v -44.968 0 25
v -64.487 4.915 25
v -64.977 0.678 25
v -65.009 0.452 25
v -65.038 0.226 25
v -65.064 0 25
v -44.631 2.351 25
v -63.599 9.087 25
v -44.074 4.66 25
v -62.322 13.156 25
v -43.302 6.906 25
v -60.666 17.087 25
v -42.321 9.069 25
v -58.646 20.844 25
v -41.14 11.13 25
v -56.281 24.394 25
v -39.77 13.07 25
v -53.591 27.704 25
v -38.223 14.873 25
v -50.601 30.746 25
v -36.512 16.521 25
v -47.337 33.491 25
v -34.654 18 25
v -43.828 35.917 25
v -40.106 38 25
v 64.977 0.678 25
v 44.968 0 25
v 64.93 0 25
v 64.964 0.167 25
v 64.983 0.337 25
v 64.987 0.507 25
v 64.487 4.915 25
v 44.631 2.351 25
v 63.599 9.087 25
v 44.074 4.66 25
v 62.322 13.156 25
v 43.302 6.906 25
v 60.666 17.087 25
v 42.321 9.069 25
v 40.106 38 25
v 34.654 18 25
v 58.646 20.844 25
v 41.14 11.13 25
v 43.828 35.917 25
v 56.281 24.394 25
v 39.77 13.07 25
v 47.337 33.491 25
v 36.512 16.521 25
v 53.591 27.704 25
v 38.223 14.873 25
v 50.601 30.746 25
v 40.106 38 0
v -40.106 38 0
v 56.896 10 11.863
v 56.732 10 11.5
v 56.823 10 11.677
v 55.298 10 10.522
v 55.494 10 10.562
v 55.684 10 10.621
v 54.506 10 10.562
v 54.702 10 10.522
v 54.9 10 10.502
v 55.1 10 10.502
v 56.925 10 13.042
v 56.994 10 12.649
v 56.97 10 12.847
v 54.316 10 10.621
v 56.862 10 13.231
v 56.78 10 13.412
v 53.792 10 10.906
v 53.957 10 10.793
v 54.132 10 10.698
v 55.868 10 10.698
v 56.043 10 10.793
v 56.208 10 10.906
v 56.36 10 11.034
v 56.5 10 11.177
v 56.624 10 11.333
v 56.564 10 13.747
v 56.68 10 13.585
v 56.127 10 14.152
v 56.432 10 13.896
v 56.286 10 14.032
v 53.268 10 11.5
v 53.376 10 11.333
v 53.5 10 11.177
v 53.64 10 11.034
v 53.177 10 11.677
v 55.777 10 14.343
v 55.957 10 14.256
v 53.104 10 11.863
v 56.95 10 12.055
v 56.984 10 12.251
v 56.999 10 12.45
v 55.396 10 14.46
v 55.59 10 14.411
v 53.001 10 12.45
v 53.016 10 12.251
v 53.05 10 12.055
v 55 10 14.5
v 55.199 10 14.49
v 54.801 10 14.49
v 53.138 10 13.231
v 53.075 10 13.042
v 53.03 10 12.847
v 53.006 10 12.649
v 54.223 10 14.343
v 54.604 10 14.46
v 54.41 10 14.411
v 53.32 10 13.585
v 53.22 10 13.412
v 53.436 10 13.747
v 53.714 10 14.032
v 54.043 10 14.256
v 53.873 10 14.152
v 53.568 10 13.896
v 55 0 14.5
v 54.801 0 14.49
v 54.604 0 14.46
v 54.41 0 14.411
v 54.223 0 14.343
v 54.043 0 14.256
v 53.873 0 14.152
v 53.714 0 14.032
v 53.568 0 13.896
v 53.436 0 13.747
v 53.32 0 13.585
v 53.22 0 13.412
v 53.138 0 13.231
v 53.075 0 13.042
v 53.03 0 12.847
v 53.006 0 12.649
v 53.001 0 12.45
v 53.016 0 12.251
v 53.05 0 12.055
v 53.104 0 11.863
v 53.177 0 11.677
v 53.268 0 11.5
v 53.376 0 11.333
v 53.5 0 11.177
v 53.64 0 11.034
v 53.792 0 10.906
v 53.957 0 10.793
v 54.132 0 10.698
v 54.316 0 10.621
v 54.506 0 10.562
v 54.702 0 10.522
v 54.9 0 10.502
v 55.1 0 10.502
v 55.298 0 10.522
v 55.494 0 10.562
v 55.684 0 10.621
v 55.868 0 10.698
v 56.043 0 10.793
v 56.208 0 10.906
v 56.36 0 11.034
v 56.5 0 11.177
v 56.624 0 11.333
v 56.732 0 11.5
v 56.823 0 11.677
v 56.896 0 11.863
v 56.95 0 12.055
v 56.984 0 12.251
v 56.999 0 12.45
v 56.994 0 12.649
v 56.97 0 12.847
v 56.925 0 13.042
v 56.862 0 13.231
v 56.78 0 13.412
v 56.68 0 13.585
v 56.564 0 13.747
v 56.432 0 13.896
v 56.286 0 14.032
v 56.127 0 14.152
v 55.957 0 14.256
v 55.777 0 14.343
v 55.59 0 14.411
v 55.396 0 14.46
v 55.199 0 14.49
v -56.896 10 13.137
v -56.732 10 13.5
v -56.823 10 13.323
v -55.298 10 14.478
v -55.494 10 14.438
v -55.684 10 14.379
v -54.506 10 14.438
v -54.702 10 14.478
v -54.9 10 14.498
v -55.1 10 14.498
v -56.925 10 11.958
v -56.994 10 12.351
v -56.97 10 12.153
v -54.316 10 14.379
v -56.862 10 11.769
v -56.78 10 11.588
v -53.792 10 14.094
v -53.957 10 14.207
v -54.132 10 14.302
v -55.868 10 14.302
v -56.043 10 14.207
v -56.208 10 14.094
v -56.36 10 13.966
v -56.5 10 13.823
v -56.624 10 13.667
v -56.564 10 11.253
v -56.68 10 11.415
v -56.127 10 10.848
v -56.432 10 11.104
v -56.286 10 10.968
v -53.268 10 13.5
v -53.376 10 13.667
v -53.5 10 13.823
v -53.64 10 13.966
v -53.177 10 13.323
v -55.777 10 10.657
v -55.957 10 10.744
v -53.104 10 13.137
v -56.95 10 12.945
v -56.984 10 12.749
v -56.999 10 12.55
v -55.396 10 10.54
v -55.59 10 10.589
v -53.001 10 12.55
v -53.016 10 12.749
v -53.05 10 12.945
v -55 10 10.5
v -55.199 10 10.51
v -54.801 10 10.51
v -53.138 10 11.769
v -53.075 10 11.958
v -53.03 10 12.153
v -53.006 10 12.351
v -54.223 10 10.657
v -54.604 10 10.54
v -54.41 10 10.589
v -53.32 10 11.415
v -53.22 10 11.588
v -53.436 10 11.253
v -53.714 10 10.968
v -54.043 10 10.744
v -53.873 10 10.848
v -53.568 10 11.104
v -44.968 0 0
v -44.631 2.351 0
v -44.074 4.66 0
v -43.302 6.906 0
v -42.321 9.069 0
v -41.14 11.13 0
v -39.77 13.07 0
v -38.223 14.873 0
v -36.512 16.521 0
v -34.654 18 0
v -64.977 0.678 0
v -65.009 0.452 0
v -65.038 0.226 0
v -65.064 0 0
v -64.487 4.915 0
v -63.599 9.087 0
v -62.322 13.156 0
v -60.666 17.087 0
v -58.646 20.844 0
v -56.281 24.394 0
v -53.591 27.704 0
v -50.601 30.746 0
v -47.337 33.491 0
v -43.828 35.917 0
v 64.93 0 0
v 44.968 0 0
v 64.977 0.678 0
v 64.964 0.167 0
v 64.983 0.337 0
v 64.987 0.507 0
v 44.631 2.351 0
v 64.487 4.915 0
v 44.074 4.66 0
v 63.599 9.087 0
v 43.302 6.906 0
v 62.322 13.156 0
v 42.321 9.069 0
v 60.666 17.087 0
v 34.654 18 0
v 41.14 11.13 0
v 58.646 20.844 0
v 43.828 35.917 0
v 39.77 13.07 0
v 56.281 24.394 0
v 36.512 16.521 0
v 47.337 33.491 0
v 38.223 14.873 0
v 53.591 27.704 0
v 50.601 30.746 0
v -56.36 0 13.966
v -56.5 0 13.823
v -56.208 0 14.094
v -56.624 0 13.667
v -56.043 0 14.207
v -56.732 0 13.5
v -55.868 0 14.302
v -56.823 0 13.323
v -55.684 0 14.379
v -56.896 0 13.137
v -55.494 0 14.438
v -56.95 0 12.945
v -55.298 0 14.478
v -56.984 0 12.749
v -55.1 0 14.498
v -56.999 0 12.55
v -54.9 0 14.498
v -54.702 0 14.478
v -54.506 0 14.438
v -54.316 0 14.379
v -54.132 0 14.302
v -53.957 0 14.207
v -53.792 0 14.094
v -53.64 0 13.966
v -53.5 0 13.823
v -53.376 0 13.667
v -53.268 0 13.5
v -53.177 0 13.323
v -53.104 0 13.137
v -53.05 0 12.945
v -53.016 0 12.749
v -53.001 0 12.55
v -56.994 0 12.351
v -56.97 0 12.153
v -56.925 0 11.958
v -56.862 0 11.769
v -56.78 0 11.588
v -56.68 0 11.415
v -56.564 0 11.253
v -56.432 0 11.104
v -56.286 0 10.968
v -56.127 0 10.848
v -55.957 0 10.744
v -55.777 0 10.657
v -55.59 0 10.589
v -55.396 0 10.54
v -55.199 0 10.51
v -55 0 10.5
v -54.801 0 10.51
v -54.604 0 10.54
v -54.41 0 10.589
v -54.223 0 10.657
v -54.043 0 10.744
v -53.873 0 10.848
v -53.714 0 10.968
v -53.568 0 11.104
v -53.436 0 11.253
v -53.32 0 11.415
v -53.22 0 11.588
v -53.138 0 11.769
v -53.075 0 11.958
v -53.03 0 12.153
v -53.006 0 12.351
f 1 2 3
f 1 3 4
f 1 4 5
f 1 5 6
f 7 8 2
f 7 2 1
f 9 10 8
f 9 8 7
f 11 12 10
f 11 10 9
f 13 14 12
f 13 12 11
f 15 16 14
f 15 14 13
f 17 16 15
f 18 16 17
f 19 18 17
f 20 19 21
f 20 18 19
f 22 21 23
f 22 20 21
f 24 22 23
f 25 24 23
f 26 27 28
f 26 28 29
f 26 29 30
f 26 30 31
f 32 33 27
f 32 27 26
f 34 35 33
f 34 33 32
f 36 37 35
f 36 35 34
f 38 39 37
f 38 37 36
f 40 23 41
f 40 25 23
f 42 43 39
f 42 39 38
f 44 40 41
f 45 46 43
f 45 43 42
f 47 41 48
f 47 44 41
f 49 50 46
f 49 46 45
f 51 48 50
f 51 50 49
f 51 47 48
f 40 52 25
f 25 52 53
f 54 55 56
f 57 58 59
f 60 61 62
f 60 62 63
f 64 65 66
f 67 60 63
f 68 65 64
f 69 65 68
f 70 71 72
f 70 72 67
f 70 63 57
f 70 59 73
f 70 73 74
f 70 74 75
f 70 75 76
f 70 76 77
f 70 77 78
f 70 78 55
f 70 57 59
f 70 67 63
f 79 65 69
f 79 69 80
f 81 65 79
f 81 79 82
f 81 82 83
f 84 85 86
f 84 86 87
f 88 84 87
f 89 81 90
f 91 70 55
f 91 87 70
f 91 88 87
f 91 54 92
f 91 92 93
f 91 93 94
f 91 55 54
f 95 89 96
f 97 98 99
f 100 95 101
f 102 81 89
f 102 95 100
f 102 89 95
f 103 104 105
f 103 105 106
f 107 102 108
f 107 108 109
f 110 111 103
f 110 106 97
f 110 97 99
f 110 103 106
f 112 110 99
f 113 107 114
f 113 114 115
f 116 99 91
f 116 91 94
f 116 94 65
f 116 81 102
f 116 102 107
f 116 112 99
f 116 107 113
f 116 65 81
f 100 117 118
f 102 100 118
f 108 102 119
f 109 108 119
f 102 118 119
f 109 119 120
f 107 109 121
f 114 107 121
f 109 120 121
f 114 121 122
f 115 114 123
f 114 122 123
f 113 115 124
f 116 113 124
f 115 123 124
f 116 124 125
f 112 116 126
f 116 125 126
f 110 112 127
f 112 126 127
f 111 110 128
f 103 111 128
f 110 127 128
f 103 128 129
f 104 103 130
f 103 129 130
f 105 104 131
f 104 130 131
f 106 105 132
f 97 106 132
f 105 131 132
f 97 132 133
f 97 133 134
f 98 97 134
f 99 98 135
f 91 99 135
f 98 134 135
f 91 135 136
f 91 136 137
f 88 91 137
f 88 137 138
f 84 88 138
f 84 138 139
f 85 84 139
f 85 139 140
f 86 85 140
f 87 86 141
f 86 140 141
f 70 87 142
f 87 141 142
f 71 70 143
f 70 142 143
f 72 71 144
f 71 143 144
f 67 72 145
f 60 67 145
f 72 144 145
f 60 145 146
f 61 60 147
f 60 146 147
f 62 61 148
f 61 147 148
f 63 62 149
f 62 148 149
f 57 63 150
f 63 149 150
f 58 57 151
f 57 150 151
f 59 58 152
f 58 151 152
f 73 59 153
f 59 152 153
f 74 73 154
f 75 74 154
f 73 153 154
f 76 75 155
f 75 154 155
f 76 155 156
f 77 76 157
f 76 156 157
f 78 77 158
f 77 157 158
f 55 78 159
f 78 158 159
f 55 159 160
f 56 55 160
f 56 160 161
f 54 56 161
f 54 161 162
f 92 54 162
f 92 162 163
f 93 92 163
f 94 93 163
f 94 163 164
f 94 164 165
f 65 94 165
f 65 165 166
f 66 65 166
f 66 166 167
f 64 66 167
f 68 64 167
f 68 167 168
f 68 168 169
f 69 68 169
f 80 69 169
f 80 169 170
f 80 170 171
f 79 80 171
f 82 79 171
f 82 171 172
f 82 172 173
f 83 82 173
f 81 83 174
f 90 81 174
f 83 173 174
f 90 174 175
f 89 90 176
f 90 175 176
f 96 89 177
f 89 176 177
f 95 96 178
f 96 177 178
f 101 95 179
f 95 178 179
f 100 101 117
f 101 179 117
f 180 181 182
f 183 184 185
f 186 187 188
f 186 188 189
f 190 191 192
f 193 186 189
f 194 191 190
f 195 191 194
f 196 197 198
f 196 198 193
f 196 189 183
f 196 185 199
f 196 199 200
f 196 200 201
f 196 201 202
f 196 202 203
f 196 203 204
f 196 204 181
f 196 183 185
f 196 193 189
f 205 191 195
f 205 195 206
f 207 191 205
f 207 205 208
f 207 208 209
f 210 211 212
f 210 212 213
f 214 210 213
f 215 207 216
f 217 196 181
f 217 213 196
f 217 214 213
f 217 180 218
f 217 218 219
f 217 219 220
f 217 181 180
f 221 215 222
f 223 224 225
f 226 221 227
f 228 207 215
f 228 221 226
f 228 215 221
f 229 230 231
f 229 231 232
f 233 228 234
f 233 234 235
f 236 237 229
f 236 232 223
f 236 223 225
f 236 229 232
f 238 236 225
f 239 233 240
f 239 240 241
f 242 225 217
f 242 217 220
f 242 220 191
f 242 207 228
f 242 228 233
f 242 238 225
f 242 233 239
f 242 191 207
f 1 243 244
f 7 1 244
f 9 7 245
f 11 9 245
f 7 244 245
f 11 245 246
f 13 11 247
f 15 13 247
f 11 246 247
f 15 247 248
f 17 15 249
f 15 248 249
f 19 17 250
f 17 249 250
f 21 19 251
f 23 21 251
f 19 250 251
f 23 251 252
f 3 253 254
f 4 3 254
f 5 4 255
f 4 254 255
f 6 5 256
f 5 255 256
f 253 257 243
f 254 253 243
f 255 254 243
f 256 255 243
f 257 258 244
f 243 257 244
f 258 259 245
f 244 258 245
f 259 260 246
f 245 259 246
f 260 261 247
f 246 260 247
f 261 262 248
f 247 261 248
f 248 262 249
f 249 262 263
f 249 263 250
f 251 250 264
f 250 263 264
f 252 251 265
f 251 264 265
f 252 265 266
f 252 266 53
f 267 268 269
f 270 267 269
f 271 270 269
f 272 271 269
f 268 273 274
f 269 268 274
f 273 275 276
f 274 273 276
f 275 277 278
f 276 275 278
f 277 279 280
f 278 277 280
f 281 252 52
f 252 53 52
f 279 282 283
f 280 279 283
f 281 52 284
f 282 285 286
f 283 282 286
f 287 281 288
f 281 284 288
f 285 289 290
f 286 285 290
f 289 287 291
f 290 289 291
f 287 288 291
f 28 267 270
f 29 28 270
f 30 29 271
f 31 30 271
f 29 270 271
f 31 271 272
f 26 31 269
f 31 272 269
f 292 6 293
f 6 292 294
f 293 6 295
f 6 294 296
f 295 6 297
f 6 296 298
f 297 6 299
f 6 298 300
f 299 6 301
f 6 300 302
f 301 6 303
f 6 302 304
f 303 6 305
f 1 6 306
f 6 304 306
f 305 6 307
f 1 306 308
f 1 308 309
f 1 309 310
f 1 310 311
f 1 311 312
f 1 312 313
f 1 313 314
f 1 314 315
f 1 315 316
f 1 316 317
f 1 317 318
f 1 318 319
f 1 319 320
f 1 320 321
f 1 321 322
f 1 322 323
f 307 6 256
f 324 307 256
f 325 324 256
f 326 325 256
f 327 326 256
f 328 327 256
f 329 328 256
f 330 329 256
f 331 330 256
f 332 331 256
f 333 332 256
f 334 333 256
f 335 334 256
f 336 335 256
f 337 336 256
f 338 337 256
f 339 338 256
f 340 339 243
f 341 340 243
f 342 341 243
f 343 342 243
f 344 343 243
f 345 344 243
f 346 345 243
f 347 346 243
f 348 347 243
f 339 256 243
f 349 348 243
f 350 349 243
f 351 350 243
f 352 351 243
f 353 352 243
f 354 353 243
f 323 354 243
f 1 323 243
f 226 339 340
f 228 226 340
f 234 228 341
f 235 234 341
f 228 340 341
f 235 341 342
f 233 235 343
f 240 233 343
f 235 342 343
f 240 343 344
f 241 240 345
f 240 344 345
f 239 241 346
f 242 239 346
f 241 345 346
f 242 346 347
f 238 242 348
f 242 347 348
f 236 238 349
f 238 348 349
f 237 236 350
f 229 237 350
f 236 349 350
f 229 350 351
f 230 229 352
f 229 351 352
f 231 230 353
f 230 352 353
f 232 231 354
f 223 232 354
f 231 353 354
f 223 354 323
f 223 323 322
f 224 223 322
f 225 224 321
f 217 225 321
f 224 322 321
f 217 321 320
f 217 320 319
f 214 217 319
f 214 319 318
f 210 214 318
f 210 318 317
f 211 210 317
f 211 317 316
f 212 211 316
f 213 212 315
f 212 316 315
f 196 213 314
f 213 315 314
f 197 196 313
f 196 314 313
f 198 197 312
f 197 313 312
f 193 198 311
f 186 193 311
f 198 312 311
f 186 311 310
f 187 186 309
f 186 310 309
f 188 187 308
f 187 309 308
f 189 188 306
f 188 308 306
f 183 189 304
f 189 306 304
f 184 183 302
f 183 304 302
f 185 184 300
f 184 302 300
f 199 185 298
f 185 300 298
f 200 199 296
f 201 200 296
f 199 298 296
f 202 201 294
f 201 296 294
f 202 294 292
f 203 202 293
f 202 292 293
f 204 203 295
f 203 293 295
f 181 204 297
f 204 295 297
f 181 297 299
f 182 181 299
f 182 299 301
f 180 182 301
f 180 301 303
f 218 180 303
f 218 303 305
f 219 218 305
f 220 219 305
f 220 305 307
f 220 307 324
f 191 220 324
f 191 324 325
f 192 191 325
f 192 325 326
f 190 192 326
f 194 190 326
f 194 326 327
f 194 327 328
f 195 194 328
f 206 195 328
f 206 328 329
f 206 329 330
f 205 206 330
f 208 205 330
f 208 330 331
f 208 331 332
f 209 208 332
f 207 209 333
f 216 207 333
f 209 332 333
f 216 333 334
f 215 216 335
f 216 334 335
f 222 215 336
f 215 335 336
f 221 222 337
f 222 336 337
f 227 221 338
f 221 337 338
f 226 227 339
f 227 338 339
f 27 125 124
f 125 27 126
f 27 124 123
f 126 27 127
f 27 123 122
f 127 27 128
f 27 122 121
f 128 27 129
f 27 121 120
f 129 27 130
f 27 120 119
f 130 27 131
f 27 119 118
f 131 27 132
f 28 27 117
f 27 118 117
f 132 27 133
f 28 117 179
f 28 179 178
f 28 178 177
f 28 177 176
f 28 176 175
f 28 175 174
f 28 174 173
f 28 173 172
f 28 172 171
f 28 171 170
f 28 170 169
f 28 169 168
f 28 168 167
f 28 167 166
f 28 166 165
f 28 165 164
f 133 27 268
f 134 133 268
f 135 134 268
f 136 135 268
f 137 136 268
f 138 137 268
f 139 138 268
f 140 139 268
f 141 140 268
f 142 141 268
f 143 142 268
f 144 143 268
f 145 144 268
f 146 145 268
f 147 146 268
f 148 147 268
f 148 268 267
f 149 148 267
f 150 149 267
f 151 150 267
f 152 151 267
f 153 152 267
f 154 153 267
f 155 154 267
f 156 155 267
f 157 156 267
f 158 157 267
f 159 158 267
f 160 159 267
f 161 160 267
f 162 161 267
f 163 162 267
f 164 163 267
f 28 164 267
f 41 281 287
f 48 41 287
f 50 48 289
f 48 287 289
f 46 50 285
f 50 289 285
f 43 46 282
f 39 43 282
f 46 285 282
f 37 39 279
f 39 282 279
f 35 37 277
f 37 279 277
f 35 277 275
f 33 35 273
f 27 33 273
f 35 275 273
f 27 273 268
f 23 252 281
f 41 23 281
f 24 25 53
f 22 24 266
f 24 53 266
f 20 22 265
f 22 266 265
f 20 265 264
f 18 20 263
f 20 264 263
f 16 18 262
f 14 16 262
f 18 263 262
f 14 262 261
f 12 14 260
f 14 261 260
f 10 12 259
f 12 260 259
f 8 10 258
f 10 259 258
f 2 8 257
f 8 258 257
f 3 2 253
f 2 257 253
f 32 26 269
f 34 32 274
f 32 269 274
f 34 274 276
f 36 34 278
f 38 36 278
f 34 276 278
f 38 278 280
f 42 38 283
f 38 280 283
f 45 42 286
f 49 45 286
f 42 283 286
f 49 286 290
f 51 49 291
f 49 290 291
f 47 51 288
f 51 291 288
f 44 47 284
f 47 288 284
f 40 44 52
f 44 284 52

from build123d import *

# Parameters (mm, degrees)
BOSS_EXTRUDE1_DEPTH = 25
SKETCH3_R           = 2
CUT_EXTRUDE1_DEPTH  = 10


with BuildPart() as part:
    # Sketch2 → Boss-Extrude1 (new body)
    with BuildSketch(Plane.XY):
        with BuildLine():
            Line((-34.654096647, 18), (33.564112537, 18))
            Line((33.564112537, 18), (34.654096647, 18))
            ThreePointArc((34.654096647, 18), (41.754772696, 10.113790987), (44.967734696, 0))
            Line((44.967734696, 0), (64.929939713, 0))
            ThreePointArc((64.929939713, 0), (64.983093484, 0.336809111), (64.97700751, 0.677732359))
            ThreePointArc((64.97700751, 0.677732359), (57.505542276, 22.646902561), (40.105840234, 38))
            Line((40.105840234, 38), (33.564112537, 38))
            Line((33.564112537, 38), (-40.105840234, 38))
            ThreePointArc((-40.105840234, 38), (-57.505542276, 22.646902561), (-64.97700751, 0.677732359))
            ThreePointArc((-64.97700751, 0.677732359), (-65.02406211, 0.339344907), (-65.063625193, 0))
            Line((-65.063625193, 0), (-44.967734696, 0))
            ThreePointArc((-44.967734696, 0), (-41.754772696, 10.113790987), (-34.654096647, 18))
        make_face()
    extrude(amount=BOSS_EXTRUDE1_DEPTH)

    # Sketch3 → Cut-Extrude1 (cut)
    with BuildSketch(Plane.XZ):
        with Locations(Location((-55, 12.5, 0), (0, 0, 270))):
            Circle(SKETCH3_R)
        with Locations(Location((55, 12.5, 0), (0, 0, 90))):
            Circle(SKETCH3_R)
    extrude(amount=-CUT_EXTRUDE1_DEPTH, mode=Mode.SUBTRACT)


solid = part.part
